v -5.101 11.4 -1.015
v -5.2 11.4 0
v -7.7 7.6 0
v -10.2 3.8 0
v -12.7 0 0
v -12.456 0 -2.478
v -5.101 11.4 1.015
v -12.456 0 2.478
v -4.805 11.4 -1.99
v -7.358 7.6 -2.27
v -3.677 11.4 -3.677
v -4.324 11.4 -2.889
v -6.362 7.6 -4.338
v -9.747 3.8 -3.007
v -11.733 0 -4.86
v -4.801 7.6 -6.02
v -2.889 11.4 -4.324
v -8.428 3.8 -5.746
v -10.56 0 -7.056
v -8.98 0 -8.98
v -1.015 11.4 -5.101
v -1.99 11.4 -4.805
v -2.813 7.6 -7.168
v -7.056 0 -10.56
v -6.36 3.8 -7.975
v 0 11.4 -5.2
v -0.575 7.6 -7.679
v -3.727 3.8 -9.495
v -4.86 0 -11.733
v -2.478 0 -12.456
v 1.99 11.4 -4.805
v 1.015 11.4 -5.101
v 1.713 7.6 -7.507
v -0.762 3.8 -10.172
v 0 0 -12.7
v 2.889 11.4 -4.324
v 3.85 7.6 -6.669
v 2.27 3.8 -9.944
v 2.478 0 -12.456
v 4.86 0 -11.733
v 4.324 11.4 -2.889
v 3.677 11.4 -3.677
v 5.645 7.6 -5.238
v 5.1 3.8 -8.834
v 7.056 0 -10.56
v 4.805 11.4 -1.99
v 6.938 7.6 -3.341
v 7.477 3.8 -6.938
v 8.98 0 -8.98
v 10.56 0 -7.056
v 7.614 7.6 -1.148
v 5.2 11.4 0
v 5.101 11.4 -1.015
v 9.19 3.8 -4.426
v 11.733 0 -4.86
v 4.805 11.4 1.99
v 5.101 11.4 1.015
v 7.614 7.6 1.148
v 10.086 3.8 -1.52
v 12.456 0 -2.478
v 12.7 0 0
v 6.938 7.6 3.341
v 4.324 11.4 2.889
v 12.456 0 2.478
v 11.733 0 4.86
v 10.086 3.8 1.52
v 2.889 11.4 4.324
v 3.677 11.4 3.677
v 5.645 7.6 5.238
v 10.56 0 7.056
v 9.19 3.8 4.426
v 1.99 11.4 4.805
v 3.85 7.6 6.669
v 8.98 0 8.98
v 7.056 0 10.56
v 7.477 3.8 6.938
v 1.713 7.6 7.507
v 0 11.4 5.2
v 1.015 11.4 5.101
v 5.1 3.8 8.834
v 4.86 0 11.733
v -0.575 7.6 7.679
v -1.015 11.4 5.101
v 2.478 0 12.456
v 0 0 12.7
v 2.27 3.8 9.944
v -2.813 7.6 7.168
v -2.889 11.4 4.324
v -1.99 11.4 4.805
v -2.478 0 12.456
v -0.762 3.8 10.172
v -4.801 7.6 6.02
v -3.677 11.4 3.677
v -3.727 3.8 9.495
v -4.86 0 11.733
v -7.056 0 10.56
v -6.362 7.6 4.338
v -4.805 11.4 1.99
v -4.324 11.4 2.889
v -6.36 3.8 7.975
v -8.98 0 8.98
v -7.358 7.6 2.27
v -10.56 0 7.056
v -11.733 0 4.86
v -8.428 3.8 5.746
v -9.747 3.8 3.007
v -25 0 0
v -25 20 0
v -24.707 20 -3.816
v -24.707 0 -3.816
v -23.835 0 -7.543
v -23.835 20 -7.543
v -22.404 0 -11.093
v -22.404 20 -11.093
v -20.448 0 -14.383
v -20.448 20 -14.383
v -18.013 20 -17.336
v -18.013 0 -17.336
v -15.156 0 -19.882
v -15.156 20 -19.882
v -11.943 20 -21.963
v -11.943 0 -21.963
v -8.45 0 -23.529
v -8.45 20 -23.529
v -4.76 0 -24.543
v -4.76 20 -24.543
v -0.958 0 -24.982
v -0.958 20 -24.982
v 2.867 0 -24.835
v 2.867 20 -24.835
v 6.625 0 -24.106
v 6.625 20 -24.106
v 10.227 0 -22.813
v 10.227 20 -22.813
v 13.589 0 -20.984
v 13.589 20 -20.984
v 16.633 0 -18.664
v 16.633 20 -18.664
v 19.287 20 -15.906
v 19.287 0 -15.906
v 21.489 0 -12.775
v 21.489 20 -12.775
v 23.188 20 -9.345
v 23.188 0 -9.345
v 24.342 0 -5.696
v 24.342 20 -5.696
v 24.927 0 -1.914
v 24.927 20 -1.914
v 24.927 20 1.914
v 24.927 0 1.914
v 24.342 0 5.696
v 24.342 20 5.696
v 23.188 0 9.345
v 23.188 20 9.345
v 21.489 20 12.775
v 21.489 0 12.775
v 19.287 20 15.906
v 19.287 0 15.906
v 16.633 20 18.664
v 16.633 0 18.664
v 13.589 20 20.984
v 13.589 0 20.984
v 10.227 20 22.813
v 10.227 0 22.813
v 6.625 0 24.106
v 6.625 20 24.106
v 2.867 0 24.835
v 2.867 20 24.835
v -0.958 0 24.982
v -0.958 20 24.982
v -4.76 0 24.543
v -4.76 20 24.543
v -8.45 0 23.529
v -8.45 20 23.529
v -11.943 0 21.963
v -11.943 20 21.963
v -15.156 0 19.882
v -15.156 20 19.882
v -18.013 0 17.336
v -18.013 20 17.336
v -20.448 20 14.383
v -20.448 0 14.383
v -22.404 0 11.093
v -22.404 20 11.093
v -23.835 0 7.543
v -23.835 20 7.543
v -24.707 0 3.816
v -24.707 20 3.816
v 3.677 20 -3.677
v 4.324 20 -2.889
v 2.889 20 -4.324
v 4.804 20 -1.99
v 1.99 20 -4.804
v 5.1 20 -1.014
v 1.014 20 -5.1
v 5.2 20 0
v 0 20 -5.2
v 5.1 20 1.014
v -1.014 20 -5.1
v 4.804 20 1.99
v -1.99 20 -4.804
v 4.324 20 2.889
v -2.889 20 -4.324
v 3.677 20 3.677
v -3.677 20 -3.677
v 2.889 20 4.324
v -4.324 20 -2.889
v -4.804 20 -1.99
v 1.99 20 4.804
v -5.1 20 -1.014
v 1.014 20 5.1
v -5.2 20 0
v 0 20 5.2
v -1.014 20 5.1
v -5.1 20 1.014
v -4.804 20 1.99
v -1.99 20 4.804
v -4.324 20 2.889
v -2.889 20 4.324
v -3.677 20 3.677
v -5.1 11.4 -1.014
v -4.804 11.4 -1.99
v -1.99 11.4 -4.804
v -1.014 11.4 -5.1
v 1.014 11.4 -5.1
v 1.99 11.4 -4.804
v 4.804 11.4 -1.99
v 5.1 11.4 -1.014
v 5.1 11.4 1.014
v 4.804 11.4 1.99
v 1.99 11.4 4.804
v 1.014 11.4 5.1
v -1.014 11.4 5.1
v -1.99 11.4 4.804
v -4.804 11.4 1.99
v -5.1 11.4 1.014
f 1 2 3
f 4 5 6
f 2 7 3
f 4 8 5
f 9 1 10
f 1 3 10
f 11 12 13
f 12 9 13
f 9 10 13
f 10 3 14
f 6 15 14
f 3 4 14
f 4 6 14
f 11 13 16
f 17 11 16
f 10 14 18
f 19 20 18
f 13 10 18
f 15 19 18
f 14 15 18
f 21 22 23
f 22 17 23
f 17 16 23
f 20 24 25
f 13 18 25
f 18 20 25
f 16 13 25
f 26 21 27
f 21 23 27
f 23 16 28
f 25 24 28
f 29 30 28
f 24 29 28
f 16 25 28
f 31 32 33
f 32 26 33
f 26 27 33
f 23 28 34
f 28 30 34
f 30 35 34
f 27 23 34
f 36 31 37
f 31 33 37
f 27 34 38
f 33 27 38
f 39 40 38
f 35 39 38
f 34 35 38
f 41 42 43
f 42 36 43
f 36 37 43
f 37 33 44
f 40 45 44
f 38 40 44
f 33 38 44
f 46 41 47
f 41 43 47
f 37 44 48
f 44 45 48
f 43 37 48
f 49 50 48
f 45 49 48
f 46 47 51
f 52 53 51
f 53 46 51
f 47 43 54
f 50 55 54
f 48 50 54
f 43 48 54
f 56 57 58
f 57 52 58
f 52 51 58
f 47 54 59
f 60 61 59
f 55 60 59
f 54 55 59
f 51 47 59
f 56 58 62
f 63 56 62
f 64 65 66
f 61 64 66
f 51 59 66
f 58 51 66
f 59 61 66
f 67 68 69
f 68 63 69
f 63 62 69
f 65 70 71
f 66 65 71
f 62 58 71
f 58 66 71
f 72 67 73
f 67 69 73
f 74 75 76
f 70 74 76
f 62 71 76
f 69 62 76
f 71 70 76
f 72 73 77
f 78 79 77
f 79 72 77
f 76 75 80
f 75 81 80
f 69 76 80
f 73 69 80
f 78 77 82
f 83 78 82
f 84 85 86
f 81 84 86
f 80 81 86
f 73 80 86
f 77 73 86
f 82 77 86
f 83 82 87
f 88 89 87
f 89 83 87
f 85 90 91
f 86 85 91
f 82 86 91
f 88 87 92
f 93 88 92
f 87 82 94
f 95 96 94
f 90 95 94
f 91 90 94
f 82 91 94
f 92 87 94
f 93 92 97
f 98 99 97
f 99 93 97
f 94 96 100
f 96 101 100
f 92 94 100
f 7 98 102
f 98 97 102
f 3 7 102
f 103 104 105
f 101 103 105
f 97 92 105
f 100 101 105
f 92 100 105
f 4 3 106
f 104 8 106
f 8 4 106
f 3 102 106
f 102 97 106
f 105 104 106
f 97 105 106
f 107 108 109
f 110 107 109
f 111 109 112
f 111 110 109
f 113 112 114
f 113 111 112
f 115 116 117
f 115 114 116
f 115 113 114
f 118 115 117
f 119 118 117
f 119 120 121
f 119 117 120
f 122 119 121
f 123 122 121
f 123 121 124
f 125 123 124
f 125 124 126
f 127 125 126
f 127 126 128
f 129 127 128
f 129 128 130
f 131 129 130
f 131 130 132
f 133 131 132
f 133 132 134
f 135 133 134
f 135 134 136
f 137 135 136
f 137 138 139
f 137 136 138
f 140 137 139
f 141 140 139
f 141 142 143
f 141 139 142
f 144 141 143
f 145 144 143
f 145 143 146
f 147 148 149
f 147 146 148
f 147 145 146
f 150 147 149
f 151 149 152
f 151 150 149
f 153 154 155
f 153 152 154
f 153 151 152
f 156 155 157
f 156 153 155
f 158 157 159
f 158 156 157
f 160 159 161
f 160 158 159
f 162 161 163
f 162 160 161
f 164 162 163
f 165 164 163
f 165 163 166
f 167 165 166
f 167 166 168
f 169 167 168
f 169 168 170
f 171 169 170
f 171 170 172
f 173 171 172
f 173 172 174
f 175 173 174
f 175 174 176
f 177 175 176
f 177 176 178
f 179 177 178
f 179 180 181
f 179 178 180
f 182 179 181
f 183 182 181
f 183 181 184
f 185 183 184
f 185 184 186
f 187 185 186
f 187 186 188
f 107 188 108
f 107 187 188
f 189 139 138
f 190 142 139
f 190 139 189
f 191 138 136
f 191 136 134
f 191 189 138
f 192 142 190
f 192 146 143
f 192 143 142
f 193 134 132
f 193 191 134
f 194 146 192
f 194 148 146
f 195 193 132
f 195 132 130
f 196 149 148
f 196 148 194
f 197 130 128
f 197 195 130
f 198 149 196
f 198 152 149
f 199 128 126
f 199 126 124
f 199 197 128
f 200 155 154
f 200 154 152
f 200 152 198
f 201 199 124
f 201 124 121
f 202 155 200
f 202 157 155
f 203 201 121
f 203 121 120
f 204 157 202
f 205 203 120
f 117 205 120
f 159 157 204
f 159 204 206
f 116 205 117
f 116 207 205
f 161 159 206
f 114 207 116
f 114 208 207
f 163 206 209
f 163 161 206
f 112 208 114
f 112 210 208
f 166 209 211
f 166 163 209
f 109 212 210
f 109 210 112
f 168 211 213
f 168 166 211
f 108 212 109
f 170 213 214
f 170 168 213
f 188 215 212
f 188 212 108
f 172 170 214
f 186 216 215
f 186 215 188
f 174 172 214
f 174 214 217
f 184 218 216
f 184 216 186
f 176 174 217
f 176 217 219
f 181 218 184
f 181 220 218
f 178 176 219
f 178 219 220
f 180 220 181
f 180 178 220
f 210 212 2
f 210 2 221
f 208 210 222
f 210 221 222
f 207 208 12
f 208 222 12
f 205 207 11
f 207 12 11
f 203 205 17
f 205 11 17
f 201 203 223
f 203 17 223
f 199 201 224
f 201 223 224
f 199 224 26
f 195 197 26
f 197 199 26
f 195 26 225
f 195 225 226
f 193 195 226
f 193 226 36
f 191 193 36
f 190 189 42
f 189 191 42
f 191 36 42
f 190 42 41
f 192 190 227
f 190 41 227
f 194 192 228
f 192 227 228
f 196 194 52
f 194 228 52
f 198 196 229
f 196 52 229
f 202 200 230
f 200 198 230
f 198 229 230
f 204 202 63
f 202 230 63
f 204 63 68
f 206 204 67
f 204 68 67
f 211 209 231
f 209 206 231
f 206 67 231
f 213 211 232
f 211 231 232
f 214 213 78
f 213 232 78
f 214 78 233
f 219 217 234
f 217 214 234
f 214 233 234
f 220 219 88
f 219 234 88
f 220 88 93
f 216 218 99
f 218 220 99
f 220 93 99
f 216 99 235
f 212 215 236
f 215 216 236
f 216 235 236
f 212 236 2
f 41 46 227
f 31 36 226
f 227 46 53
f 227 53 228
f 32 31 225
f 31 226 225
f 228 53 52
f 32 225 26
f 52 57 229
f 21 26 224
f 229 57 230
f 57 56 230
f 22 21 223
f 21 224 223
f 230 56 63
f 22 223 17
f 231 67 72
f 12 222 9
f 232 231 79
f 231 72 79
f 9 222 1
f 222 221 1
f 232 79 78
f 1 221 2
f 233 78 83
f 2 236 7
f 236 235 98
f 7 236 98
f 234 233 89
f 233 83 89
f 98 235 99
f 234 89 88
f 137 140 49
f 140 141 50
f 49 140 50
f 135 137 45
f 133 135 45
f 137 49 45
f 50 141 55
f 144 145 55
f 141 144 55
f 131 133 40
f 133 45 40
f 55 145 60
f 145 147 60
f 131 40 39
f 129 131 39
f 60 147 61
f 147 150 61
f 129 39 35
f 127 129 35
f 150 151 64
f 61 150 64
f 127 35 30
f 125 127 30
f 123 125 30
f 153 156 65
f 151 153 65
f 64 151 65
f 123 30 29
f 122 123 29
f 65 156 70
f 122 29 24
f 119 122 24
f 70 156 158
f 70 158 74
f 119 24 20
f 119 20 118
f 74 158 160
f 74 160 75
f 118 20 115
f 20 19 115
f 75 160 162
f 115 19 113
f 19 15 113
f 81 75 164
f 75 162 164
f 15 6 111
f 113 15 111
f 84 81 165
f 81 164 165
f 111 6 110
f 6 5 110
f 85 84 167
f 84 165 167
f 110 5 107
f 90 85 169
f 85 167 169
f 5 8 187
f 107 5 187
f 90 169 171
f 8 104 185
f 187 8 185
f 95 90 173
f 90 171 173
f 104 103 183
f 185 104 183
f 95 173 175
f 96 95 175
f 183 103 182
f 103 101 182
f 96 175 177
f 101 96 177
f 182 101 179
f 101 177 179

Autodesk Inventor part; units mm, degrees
ref_plane "YZ Plane" through (0, 0, 0) normal (1, 0, 0) x (0, 1, 0)
ref_plane "XZ Plane" through (0, 0, 0) normal (0, 1, 0) x (-1, 0, 0)
ref_plane "XY Plane" through (0, 0, 0) normal (0, 0, 1) x (1, 0, 0)
sketch "Sketch1" plane through (0, 0, 0) normal (0, 1, 0) x (-1, 0, 0)
  circle A0 centre (0, 0) radius 25
  circle A1 centre (0, 0) radius 12.7
  circle A2 centre (0, 0) radius 5.2
  dimension "d1" = 50
  dimension "d14" = 25.4
  dimension "d15" = 10.4
extrude "Extrusion1" add sketch "Sketch1" along normal blind 20 contours A0 | A1 | A2
extrude "Extrusion2" cut sketch "Sketch1" along normal blind 11.4 contours A1
extrude "Extrusion3" cut sketch "Sketch1" along normal blind 20 contours A2
chamfer "Chamfer2" distance 11.4 distance2 7.5 1 edges at (12.7, 11.4, 0) measured on face at (-12.5355, 7.6, -2.0372)
properties part number "3. ring"
